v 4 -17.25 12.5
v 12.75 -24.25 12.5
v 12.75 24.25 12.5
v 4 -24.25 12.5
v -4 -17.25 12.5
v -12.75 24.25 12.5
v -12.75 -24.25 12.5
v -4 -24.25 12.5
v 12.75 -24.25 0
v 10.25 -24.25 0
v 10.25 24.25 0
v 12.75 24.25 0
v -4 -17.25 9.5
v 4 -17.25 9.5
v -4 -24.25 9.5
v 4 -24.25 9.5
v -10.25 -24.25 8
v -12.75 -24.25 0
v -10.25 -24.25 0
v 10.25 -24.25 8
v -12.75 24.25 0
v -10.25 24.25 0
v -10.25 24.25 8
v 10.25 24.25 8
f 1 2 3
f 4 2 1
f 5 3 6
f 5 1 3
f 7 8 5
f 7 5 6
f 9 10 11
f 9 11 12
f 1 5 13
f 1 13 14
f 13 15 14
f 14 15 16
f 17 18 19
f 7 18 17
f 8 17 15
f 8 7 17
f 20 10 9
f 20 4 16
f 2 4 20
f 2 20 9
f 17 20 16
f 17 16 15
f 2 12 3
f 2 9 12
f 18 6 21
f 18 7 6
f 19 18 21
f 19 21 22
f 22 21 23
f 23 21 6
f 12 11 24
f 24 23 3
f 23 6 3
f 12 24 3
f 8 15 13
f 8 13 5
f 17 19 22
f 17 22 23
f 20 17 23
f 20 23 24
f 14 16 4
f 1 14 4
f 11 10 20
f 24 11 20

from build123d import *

# Parameters (mm, degrees)
F0_W     = 2.5
F0_H     = 8
F1_DEPTH = 24.25
F2_W     = 8
F2_H     = 3
F3_DEPTH = 7


with BuildPart() as f1:
    # F0 (on Front) → F1 (new body, symmetric)
    with BuildSketch(Plane.XZ):
        Polygon((-12.75, 12.5), (-12.75, 8), (-10.25, 8), (10.25, 8), (12.75, 8), (12.75, 12.5), align=None)
        with Locations((-11.5, 4)):
            Rectangle(F0_W, F0_H)
        with Locations((11.5, 4)):
            Rectangle(F0_W, F0_H)
    extrude(amount=F1_DEPTH, both=True)

    # F2 (on face) → F3 (cut)
    with BuildSketch(Plane.XZ.offset(24.25)):
        with Locations((0, 11)):
            Rectangle(F2_W, F2_H)
    extrude(amount=-F3_DEPTH, mode=Mode.SUBTRACT)


solid = f1.part
